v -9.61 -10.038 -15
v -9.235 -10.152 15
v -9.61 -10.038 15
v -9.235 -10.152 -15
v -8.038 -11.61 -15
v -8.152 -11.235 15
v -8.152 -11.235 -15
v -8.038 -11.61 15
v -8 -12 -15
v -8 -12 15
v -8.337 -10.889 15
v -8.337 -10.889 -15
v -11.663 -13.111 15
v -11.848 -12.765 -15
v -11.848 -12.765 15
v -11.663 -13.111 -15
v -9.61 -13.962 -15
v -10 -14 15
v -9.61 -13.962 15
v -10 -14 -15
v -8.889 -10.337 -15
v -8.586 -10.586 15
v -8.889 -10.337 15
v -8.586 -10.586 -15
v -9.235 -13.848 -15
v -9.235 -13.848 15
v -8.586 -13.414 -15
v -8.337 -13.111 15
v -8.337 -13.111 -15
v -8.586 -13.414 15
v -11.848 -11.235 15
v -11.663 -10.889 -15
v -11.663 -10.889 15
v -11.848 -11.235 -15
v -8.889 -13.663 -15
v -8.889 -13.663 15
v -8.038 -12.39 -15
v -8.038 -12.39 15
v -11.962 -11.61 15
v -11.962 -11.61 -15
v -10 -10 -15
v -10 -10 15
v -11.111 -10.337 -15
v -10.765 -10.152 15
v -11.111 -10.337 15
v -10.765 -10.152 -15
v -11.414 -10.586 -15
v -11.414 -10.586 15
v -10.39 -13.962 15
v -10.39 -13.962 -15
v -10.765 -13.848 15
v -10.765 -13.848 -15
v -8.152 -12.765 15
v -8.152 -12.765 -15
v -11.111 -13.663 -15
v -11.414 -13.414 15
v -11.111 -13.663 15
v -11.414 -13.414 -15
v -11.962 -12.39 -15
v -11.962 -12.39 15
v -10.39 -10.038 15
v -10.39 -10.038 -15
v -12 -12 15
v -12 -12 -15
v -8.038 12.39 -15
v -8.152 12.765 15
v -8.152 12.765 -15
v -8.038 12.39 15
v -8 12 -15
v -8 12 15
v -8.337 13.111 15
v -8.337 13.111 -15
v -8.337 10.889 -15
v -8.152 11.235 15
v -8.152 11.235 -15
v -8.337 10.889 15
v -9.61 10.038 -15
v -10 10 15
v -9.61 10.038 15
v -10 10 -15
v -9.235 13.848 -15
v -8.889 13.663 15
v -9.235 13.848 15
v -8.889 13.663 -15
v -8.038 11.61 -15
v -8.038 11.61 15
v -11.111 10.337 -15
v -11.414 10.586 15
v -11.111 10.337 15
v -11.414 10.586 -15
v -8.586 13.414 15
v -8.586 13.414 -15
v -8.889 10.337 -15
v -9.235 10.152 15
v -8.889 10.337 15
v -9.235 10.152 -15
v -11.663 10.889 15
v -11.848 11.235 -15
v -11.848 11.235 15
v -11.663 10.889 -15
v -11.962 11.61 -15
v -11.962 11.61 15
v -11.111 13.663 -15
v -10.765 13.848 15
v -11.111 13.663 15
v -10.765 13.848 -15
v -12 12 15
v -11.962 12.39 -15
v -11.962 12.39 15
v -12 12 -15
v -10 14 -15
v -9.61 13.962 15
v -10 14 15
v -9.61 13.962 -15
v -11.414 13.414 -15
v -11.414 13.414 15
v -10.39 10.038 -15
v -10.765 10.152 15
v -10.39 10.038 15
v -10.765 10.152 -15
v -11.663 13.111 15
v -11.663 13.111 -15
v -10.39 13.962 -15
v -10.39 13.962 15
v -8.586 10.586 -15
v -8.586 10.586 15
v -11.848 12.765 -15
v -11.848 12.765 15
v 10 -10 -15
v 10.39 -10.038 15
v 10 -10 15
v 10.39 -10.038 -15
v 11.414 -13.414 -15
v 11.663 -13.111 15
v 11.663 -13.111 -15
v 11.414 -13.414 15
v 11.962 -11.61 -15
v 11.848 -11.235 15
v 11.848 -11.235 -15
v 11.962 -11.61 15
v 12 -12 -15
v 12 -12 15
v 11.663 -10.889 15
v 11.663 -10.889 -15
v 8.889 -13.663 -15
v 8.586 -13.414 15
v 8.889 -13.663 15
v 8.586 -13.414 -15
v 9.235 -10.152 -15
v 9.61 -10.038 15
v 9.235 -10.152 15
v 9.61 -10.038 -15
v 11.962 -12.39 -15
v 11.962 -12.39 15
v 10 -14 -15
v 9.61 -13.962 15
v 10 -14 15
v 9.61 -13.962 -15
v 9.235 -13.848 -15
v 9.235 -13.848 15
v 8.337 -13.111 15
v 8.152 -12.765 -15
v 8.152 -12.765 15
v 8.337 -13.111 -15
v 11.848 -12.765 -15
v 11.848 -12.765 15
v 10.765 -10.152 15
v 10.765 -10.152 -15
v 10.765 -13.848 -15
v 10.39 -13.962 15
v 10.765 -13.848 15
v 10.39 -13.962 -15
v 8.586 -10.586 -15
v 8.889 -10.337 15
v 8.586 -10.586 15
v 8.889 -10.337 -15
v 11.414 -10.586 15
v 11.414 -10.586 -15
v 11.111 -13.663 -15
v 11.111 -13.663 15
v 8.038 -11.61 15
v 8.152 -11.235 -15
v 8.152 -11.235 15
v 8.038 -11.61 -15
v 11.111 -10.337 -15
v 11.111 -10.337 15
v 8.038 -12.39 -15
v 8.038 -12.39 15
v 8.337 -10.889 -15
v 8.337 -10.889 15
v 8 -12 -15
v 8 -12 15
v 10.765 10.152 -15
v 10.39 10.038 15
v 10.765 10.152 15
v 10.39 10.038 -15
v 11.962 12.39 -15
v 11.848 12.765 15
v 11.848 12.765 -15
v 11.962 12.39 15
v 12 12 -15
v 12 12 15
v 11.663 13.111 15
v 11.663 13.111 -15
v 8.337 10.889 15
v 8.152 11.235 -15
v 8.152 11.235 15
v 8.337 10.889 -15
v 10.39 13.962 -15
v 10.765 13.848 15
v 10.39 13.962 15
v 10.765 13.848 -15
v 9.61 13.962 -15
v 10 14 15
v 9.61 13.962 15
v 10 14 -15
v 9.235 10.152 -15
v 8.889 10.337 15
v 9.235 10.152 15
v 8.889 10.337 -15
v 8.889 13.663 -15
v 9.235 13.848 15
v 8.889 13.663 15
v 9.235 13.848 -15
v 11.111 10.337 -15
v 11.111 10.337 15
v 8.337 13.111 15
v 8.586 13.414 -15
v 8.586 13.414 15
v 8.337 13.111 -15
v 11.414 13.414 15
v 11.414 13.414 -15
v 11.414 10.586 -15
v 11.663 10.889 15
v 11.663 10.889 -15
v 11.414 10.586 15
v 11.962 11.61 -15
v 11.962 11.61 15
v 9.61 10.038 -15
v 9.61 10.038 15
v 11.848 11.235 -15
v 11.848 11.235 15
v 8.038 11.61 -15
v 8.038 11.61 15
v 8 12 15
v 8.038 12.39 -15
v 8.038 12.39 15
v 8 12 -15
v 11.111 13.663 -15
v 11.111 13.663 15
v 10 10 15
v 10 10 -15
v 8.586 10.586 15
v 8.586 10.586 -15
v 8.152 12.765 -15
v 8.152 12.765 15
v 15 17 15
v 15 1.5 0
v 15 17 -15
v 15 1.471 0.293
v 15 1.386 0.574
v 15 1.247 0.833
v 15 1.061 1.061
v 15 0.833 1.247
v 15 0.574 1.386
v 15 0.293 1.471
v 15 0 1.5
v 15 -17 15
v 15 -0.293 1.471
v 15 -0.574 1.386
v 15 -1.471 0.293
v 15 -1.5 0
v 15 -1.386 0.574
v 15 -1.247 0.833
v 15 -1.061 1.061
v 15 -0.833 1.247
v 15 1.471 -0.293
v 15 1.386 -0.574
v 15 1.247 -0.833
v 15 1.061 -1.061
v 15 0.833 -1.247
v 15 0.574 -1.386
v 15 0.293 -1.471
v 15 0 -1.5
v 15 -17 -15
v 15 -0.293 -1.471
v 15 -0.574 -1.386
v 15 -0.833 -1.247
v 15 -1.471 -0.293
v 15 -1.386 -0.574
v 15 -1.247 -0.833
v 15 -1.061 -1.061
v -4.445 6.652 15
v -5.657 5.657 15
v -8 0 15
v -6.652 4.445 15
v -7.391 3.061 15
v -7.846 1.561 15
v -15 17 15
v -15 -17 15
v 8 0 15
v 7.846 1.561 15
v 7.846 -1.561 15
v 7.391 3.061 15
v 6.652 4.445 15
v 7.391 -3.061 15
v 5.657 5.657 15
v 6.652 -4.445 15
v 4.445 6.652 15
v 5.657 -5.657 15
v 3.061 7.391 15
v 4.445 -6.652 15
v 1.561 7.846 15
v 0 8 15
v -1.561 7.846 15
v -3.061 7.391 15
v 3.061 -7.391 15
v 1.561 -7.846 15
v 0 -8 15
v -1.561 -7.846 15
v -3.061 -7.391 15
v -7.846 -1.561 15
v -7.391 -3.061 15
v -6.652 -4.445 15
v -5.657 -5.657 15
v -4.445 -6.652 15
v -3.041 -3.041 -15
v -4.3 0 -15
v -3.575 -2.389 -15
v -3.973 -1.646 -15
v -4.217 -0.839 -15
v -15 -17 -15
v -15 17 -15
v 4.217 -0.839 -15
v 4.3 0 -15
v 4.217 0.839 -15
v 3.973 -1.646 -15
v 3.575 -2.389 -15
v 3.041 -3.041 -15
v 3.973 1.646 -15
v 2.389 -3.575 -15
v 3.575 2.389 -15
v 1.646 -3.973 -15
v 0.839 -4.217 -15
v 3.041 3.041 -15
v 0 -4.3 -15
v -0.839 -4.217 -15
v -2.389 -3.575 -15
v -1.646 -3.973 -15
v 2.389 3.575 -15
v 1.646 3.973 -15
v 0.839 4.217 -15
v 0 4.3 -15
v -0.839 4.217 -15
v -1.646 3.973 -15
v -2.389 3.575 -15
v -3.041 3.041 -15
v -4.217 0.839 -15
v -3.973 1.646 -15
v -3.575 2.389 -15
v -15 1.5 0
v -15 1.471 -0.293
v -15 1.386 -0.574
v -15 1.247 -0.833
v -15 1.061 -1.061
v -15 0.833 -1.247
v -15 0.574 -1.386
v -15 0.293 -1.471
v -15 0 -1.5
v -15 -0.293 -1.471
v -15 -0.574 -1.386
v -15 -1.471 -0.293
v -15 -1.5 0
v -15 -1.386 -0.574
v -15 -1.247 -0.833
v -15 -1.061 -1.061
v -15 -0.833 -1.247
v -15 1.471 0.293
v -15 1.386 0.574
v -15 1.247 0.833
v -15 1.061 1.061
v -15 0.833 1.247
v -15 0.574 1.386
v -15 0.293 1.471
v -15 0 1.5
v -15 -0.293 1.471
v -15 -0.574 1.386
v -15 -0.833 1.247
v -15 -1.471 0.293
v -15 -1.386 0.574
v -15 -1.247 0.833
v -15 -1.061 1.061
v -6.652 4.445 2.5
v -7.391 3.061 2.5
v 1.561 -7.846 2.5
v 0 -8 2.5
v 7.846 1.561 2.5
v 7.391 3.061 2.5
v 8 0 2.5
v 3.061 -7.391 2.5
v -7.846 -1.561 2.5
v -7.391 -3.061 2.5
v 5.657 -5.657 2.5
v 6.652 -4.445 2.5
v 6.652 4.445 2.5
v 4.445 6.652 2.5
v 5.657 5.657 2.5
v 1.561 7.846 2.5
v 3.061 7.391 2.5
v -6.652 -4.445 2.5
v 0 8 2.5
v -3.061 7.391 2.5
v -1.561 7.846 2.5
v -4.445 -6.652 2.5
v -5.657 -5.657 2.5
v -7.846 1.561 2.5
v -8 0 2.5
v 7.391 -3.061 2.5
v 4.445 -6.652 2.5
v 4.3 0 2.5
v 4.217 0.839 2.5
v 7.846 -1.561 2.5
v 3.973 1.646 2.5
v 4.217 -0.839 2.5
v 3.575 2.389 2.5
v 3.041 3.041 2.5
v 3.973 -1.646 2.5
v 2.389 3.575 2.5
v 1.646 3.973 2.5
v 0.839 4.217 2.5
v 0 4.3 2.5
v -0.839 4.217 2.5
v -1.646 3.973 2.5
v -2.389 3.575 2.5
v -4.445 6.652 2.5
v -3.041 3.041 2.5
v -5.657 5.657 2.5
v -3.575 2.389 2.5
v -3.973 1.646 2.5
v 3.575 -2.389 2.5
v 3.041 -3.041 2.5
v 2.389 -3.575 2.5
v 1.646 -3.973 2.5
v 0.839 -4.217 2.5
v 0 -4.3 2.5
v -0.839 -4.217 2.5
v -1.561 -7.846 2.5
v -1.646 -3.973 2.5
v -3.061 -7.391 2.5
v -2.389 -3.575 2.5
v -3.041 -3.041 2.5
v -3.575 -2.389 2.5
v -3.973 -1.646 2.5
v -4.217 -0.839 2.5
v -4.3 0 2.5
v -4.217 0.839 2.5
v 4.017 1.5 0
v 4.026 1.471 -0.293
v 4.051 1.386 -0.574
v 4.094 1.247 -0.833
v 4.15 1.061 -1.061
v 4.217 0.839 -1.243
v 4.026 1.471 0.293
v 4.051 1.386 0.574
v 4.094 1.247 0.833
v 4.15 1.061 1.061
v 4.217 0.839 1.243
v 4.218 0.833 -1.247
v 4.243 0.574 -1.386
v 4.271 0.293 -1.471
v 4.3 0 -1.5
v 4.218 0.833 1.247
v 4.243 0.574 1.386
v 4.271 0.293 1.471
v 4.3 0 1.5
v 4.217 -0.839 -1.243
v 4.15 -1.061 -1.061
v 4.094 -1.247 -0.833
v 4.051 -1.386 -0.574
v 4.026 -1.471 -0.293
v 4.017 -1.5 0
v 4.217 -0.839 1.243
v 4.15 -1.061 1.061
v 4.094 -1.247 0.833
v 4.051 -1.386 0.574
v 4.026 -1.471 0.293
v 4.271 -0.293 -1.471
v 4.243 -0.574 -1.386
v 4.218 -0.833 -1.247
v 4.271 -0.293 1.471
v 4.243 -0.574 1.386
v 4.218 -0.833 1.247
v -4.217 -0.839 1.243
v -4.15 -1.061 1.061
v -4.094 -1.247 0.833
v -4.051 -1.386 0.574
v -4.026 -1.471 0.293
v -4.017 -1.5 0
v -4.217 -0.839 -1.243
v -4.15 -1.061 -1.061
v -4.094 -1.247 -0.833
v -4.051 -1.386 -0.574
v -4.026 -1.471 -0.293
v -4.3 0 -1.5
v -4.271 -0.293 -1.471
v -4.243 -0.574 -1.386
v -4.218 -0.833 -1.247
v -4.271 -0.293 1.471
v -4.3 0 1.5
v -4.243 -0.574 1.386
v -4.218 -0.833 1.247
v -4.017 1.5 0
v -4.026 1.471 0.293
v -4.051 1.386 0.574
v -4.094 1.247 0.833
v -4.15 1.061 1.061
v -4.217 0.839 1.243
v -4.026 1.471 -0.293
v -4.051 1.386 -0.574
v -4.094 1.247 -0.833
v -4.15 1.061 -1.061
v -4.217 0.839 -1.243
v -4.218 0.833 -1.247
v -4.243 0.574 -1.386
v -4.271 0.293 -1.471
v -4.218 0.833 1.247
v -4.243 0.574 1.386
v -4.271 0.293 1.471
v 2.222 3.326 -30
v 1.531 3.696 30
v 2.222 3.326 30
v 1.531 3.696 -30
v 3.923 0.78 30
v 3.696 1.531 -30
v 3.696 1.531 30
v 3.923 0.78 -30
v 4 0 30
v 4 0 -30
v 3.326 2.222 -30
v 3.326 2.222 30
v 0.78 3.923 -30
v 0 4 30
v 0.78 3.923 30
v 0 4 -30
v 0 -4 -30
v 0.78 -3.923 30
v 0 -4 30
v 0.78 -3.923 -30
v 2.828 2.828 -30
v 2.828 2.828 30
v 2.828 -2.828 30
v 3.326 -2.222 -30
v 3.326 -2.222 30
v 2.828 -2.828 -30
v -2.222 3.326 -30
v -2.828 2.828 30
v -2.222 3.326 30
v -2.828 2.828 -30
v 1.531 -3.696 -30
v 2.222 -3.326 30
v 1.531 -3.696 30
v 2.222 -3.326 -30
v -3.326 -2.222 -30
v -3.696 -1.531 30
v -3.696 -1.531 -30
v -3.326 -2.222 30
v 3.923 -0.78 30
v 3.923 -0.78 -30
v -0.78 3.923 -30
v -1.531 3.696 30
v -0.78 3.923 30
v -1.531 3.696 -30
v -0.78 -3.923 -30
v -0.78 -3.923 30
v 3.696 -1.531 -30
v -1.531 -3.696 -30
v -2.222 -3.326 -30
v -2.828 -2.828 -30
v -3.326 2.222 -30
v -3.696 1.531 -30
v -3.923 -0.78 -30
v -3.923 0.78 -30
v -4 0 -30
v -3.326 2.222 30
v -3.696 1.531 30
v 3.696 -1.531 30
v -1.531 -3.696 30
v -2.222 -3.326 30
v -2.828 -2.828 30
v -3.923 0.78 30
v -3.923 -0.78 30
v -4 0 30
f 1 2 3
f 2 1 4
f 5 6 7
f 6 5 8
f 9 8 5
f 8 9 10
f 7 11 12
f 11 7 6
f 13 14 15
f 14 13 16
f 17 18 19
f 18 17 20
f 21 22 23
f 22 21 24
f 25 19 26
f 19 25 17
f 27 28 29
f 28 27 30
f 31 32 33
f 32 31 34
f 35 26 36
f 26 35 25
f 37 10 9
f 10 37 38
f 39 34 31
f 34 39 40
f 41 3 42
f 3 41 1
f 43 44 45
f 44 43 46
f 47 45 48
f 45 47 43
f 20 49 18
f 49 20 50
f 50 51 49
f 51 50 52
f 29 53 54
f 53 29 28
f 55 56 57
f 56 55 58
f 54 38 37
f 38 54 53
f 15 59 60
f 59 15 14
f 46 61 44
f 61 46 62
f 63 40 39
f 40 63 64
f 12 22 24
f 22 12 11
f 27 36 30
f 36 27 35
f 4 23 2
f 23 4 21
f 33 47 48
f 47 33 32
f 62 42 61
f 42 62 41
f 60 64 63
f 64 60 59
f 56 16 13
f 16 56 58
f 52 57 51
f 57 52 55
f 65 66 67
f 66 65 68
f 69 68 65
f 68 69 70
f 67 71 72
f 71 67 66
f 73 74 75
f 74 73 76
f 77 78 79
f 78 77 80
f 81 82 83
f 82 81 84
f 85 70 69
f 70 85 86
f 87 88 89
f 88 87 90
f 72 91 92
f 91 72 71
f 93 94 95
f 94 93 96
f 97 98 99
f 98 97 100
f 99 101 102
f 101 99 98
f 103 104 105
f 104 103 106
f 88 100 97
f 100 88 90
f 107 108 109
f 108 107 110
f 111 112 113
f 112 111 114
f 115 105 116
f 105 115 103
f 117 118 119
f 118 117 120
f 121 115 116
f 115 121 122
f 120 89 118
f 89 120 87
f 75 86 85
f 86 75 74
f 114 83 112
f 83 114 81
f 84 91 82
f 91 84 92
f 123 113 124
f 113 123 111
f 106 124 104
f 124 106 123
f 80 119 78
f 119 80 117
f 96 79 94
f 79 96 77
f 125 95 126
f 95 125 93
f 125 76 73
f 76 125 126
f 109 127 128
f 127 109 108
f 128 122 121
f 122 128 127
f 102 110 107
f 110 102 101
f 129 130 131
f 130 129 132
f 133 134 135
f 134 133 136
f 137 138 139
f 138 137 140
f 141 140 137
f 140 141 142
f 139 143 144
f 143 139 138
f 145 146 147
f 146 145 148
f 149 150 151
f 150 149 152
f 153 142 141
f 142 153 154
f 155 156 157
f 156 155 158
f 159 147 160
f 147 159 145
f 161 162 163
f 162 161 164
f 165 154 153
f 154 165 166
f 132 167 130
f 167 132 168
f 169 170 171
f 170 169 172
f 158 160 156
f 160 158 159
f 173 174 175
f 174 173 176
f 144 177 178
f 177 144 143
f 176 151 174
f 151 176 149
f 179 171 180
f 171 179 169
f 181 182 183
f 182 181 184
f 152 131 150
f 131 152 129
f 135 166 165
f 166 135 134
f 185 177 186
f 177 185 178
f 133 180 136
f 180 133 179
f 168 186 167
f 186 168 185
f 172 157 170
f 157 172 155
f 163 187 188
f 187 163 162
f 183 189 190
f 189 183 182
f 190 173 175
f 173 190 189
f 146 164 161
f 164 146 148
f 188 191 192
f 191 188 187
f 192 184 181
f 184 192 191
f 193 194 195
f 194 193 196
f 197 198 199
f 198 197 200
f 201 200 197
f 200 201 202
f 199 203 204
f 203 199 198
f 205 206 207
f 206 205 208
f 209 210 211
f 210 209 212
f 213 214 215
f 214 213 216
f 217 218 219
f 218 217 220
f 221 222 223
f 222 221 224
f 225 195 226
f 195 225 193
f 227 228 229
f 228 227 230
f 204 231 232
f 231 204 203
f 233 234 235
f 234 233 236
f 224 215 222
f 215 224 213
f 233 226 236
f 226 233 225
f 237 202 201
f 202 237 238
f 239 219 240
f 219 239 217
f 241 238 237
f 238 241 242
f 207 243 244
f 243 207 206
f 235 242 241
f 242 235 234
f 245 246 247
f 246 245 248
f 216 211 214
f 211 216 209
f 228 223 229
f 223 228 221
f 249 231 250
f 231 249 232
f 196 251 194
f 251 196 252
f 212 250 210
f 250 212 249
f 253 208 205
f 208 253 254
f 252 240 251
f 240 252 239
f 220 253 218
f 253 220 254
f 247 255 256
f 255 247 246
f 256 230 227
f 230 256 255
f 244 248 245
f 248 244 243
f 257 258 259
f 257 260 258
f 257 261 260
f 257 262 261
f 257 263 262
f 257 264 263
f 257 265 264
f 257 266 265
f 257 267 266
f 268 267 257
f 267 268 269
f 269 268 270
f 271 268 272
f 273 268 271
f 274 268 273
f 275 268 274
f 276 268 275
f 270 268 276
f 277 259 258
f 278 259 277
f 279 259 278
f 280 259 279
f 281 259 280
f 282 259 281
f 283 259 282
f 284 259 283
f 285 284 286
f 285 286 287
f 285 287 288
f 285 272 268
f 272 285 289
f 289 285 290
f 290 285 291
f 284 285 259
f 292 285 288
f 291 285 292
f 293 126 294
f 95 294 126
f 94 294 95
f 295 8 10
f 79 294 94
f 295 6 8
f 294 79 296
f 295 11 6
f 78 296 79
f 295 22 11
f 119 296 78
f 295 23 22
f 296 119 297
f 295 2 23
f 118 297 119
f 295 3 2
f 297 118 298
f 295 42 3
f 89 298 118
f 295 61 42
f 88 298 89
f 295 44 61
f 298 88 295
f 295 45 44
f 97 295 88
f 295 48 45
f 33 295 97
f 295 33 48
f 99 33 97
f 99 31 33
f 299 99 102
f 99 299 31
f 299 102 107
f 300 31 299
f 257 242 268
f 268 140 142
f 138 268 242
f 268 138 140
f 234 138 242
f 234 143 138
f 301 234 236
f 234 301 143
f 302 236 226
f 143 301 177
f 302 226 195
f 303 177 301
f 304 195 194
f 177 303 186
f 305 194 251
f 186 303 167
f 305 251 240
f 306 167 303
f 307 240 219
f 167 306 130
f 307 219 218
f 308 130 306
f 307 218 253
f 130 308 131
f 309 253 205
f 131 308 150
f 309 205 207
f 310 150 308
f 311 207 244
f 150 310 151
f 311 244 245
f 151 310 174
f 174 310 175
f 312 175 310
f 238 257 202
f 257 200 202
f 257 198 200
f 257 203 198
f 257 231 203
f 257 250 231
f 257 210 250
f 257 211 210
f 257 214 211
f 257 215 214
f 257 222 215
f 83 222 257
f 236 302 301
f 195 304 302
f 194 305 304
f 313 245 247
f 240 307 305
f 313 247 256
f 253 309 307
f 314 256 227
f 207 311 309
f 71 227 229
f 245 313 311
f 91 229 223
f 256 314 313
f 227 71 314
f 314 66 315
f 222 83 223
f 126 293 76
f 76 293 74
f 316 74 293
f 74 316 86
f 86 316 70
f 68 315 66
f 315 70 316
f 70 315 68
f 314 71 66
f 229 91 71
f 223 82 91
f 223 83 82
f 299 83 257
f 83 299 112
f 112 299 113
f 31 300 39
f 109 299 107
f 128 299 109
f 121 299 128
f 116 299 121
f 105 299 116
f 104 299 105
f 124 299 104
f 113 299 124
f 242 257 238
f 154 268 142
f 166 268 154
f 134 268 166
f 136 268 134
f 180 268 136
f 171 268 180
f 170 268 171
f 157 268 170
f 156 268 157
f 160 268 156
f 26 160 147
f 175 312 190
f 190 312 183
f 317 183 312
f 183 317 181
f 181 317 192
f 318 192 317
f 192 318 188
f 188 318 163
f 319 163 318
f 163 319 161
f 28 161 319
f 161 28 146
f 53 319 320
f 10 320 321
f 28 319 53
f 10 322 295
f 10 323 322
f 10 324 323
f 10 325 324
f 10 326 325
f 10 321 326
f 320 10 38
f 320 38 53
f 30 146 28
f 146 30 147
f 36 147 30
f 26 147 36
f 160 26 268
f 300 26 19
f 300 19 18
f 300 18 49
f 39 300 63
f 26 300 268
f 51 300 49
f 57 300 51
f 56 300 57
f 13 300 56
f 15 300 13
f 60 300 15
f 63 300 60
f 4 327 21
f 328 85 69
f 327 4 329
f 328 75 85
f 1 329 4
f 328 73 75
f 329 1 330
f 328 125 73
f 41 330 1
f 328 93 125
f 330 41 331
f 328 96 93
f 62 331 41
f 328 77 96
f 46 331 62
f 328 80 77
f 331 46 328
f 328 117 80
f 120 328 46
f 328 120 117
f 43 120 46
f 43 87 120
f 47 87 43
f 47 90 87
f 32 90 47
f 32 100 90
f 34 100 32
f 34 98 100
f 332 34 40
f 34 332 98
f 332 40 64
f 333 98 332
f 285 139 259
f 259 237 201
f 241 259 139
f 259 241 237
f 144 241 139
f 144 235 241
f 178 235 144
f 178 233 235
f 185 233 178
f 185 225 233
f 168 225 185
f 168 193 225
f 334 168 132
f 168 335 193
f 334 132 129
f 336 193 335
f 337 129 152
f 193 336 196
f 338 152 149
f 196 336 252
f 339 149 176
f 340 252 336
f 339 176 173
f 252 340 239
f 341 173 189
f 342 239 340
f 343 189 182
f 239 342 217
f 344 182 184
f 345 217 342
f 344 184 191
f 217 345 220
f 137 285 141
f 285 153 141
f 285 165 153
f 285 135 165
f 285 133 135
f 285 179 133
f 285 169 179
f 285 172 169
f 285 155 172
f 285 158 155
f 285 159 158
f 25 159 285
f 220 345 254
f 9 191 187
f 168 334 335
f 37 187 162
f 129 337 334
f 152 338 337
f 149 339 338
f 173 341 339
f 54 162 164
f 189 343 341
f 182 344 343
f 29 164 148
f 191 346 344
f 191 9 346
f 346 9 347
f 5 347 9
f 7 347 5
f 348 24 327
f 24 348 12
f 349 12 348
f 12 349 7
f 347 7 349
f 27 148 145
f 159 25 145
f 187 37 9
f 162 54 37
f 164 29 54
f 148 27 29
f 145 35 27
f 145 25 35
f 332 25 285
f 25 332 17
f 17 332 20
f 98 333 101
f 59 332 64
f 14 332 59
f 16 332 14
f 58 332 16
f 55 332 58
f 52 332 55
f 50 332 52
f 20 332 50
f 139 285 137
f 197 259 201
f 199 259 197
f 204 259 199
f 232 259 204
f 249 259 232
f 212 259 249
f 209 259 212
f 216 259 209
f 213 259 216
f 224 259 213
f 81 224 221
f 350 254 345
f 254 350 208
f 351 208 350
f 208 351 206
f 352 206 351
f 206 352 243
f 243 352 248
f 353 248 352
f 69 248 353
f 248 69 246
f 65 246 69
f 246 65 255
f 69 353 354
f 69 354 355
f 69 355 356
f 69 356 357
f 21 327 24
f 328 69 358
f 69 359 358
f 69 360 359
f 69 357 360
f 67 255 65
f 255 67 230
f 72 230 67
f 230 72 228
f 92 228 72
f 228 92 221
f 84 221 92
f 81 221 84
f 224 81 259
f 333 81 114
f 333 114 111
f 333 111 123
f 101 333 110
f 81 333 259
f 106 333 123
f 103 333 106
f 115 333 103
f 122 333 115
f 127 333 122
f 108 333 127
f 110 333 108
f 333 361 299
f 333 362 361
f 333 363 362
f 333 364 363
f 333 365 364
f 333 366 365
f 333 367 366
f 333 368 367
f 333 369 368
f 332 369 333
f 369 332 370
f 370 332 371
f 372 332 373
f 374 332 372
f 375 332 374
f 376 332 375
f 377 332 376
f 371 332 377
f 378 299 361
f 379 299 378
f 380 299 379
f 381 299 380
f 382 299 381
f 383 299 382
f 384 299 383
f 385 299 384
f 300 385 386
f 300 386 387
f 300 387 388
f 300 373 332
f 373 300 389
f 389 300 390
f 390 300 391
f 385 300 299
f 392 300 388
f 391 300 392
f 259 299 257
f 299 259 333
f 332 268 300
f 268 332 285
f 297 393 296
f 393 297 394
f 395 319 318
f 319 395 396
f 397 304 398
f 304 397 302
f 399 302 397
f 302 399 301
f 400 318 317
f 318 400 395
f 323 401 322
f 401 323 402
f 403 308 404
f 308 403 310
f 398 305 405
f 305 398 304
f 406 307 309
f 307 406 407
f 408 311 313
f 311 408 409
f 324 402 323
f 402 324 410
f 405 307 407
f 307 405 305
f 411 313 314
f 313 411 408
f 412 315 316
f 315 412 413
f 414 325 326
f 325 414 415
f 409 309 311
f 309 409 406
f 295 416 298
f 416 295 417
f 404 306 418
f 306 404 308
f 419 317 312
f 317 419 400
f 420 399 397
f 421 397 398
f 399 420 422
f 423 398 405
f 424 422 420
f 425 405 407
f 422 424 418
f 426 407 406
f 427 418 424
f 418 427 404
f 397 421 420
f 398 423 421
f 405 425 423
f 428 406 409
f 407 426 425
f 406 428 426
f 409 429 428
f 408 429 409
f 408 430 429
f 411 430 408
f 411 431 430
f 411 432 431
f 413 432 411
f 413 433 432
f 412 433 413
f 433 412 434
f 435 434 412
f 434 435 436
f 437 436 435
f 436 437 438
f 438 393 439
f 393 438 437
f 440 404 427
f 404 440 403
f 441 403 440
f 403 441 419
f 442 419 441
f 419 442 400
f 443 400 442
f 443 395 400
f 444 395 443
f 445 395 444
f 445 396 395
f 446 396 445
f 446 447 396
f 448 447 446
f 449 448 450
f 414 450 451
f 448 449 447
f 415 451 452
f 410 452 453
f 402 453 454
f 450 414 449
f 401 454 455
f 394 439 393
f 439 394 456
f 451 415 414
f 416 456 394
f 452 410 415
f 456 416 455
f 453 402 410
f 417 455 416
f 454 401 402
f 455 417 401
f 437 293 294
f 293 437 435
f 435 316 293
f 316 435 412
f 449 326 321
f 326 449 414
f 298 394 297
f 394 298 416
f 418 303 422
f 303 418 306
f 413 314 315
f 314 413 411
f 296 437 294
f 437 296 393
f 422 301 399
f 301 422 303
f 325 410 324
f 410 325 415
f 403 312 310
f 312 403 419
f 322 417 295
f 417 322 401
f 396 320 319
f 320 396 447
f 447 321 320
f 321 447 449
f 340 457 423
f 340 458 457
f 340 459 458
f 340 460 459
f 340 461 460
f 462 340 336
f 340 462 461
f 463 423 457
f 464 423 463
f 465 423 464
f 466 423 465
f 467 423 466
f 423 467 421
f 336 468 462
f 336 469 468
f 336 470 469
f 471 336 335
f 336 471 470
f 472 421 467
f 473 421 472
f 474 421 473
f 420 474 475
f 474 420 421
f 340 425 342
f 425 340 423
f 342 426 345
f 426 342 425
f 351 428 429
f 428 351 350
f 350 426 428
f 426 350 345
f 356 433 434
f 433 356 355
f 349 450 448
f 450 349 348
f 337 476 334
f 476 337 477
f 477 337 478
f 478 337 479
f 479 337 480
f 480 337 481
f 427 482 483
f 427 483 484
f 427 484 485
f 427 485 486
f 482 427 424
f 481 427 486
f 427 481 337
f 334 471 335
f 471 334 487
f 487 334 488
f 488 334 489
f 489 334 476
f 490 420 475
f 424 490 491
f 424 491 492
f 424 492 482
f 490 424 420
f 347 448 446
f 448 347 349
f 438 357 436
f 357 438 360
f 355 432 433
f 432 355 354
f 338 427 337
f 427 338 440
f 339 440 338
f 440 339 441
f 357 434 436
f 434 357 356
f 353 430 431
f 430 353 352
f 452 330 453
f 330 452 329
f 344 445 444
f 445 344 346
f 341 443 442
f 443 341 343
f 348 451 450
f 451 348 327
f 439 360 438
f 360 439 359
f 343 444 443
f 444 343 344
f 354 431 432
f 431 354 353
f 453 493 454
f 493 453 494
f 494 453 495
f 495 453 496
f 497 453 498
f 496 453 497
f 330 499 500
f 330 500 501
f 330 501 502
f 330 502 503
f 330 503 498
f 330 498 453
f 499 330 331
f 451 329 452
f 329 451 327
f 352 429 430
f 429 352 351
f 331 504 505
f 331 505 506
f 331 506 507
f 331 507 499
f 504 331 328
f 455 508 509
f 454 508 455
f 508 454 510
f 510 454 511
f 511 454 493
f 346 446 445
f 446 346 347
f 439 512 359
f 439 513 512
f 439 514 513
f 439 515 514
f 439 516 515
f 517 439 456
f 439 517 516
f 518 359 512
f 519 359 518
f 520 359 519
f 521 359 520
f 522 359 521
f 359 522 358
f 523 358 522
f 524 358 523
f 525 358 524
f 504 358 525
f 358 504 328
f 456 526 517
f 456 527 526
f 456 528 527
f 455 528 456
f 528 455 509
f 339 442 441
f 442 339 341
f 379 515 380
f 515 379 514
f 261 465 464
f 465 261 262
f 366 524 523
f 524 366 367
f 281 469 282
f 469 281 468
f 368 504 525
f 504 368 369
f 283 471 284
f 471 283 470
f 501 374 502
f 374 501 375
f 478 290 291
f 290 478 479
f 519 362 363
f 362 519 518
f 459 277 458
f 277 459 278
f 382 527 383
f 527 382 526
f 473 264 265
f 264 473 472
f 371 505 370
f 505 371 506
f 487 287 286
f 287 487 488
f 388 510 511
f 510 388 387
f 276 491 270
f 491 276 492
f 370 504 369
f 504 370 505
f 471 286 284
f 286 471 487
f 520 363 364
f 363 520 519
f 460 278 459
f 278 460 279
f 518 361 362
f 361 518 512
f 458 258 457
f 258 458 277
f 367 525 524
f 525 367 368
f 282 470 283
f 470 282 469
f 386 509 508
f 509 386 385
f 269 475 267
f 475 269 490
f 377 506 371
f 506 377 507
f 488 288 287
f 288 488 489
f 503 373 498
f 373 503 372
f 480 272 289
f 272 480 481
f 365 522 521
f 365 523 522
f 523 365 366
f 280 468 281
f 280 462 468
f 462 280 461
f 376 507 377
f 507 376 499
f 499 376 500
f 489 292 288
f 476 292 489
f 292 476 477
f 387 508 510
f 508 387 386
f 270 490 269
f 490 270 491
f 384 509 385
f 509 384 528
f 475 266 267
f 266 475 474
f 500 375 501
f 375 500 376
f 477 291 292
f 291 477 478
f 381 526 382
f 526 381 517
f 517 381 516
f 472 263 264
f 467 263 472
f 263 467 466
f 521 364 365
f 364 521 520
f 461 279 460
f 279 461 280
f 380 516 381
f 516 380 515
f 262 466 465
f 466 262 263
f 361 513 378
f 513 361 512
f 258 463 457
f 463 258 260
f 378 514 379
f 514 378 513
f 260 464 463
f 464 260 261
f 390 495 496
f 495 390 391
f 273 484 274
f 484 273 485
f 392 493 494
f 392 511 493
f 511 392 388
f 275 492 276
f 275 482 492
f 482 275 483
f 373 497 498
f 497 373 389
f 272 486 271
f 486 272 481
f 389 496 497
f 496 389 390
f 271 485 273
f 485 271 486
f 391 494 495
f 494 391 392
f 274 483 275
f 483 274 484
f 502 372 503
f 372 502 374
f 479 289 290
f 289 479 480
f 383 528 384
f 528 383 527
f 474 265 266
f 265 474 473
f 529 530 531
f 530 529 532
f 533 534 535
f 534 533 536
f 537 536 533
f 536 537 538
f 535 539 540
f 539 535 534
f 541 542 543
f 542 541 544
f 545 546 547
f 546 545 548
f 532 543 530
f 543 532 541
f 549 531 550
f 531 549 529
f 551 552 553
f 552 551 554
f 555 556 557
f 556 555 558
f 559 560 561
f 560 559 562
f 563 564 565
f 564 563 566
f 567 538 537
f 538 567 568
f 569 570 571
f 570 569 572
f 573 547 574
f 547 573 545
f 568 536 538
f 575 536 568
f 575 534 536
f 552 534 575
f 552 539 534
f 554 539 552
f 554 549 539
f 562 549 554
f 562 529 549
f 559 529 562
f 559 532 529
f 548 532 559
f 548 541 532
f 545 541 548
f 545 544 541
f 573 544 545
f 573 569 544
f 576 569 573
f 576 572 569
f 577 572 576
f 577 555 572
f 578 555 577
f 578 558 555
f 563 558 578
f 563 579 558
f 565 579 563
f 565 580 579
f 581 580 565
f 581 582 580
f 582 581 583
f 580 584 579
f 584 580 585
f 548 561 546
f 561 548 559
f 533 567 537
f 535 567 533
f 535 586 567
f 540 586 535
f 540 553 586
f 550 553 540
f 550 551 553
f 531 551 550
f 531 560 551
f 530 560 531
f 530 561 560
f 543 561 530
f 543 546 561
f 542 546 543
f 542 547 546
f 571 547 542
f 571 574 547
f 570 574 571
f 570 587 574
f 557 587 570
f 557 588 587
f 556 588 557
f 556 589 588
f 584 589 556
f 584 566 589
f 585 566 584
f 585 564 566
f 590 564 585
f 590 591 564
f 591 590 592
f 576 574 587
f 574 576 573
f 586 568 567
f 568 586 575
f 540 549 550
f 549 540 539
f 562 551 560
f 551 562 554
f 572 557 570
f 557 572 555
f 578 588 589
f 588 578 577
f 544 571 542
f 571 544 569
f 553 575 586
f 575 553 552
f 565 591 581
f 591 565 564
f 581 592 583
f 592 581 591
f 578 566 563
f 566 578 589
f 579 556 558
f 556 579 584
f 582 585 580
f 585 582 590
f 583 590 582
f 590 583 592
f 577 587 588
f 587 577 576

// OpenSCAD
// Parameters
block_width_x = 30; //[15:60:1]
block_depth_y = 34; //[17:68:1]
block_height_z = 30; //[15:60:1]
leadscrew_diameter = 8; //[4:16:0.5]
leadscrew_clearance = 0.3; //[0.1:1:0.05]
nut_pocket_diameter = 16; //[8:32:0.5]
nut_pocket_depth = 12; //[6:24:0.5]
mount_hole_diameter = 4; //[2:8:0.5]
mount_hole_pattern_x = 20; //[10:40:1]
mount_hole_pattern_y = 24; //[12:48:1]
anti_rotation_feature_size = 3; //[1.5:8:0.5]
anti_rotation_feature_z = 0; //[-10:10:0.5]
leadscrew_length = 60; //[30:120:1]
overlap = 1; //[0.5:2:0.1]

// Leadscrew - complete geometry
module leadscrew() {
  color("Silver") {
    cylinder(r=leadscrew_diameter/2, h=leadscrew_length, center=true, $fn=32);
  }
}

// Main housing block
module housing() {
  color([0.85, 0.85, 0.8]) {
    difference() {
      // Main body block
      cube([block_width_x, block_depth_y, block_height_z], center=true);
      
      // Nut capture pocket
      translate([0, 0, block_height_z/2 - nut_pocket_depth/2])
        cylinder(r=nut_pocket_diameter/2, h=nut_pocket_depth + overlap, center=true, $fn=32);
      
      // Leadscrew through-bore
      cylinder(r=(leadscrew_diameter + 2*leadscrew_clearance)/2, h=block_height_z + 2*overlap, center=true, $fn=32);
      
      // Mounting holes
      for (x = [-mount_hole_pattern_x/2, mount_hole_pattern_x/2])
        for (y = [-mount_hole_pattern_y/2, mount_hole_pattern_y/2])
          translate([x, y, 0])
            cylinder(r=mount_hole_diameter/2, h=block_height_z + 2*overlap, center=true, $fn=32);
      
      // Anti-rotation feature
      rotate([0, 90, 0])
        translate([0, 0, anti_rotation_feature_z])
          cylinder(r=anti_rotation_feature_size/2, h=block_width_x + 2*overlap, center=true, $fn=32);
    }
  }
}

// Assembly
module assembly() {
  union() {
    housing();
    leadscrew();
  }
}

assembly();
